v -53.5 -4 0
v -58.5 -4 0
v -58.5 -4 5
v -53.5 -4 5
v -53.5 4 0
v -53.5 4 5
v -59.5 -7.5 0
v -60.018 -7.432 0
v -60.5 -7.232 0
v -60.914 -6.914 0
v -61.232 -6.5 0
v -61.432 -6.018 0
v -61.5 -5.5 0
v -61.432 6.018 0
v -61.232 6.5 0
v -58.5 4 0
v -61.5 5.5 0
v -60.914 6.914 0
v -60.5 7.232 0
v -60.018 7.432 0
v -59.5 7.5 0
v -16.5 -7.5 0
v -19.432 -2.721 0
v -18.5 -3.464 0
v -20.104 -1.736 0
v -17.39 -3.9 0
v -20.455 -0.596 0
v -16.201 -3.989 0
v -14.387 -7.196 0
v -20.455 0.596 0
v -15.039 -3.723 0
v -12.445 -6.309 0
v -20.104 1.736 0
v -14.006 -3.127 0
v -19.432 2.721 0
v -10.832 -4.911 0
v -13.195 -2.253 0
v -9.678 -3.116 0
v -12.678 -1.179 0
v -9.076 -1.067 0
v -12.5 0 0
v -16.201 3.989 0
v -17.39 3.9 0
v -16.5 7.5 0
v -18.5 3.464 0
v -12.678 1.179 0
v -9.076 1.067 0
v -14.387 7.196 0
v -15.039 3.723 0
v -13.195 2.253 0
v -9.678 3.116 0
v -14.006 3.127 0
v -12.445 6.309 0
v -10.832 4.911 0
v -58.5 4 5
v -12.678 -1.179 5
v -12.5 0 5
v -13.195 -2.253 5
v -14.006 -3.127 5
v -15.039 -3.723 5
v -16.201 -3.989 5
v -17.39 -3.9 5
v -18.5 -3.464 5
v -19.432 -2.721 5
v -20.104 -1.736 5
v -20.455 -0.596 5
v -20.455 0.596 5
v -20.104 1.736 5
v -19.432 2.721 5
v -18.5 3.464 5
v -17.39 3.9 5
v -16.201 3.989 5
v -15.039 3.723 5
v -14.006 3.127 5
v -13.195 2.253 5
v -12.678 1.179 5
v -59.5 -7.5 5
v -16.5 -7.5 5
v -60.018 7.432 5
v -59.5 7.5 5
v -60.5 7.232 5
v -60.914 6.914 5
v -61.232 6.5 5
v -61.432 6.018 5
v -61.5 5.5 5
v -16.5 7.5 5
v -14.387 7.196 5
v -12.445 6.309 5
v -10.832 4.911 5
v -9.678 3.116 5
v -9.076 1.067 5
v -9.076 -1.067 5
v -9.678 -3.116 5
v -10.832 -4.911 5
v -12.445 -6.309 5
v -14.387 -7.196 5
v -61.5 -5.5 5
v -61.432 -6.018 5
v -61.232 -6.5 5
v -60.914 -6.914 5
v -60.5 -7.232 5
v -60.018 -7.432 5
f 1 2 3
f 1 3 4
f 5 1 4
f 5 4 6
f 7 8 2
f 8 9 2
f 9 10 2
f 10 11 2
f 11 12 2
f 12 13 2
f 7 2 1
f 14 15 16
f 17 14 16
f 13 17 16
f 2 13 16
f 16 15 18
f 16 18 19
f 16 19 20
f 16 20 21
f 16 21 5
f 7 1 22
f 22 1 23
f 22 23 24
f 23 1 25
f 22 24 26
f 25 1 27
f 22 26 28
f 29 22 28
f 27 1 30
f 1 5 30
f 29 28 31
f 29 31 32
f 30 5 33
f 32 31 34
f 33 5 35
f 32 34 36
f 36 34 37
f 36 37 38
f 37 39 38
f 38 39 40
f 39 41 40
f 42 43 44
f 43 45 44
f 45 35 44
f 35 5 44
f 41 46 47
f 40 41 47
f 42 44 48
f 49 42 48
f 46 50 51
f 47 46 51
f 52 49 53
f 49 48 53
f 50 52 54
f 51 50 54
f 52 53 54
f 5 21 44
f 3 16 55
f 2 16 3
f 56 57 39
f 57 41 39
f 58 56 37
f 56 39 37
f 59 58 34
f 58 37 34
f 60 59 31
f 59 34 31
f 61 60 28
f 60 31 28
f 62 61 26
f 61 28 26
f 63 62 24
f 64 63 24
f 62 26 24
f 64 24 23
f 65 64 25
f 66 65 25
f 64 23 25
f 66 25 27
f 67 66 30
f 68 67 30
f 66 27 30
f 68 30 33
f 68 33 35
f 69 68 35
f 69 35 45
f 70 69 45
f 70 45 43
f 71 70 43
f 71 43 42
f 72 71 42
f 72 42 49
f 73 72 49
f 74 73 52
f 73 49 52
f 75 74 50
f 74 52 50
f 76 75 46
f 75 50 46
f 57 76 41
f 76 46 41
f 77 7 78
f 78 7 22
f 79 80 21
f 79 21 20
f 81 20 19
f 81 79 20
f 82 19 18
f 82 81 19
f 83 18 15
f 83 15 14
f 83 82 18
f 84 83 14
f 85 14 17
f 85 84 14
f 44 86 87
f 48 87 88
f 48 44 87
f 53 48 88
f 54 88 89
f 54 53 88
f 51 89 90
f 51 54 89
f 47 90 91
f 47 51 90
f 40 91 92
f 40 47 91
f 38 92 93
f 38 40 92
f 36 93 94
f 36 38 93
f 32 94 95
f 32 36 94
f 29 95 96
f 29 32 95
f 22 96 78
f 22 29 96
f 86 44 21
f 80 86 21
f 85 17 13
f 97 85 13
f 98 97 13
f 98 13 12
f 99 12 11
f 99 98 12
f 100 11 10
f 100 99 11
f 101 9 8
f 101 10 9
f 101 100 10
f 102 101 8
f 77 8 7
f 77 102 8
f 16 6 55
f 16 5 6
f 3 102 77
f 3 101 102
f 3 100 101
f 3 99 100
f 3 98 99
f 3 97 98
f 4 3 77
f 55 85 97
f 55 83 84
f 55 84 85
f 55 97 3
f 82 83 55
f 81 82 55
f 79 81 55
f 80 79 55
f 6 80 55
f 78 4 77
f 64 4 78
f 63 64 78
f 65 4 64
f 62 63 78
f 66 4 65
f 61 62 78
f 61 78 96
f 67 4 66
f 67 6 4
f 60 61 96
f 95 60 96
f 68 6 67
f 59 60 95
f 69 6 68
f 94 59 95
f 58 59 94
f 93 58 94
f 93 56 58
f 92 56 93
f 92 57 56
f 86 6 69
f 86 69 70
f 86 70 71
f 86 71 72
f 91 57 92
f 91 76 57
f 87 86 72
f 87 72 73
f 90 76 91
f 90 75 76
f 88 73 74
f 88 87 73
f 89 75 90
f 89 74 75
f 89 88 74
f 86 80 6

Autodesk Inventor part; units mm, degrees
ref_plane "YZ Plane" through (0, 0, 0) normal (1, 0, 0) x (0, 1, 0)
ref_plane "XZ Plane" through (0, 0, 0) normal (0, 1, 0) x (-1, 0, 0)
ref_plane "XY Plane" through (0, 0, 0) normal (0, 0, 1) x (1, 0, 0)
sketch "Skizze1" plane through (0, 0, 0) normal (0, 0, 1) x (1, 0, 0)
  line L0 (0, -24.15) -> (0, 24.15) projected
  line L1 (-77.25, 0) -> (33, 0) projected
  circle A0 centre (-15.5, 15.5) radius 1.75
  circle A1 centre (15.5, 15.5) radius 1.75
  circle A2 centre (-15.5, -15.5) radius 1.75
  circle A3 centre (15.5, -15.5) radius 1.75
  circle A4 centre (-16.5, 0) radius 11
  circle A5 centre (0, 0) radius 5.5
  circle A6 centre (-16.5, 0) radius 4
  arc A7 (-16.5, -7.5) -> (-16.5, 7.5) centre (-16.5, 0) ccw
  line L2 (-16.5, 7.5) -> (-36.5, 7.5)
  line L3 (-36.5, 7.5) -> (-61.5, 7.5)
  line L4 (-61.5, 7.5) -> (-61.5, -7.5)
  line L5 (-61.5, -7.5) -> (-16.5, -7.5)
  dimension "d0" = 3.5
  dimension "d1" = 15.5
  dimension "d2" = 15.5
  dimension "d3" = 22
  dimension "d4" = 16.5
  dimension "d5" = 11
  dimension "d6" = 8
  dimension "d7" = 15
  dimension "d10" = 15
  dimension "d11" = 45
extrude "Extrusion1" add sketch "Skizze1" along normal blind 5 contours A7 L5 A4 L1 A6 | L1 A6 A4 L2 A7 | A4 L1 L4 L3 L2 | L5 L4 L1 A4
sketch "Skizze3" plane through (0, 0, 0) normal (0, 0, -1) x (-1, 0, 0)
  circle A0 centre (16.5, 0) radius 4 projected
  arc A1 (16.5, 7.5) -> (16.5, -7.5) centre (16.5, 0) ccw projected
  line L0 (16.5, -7.5) -> (61.5, -7.5) projected
  line L1 (61.5, -7.5) -> (61.5, 7.5) projected
  line L2 (61.5, 7.5) -> (16.5, 7.5) projected
  line L3 (58.5, -4) -> (53.5, -4)
  line L4 (53.5, -4) -> (53.5, 4)
  line L5 (53.5, 4) -> (58.5, 4)
  line L6 (58.5, 4) -> (58.5, -4)
  line L7 (73.8, 0) -> (-12.3, 0) projected
  point P0 (0, 0)
  dimension "d17" = 5
  dimension "d18" = 8
  dimension "d19" = 3
extrude "Extrusion3" cut sketch "Skizze3" against normal blind 5 contours L7 L6 L3 L4 | L4 L5 L6 L7
fillet "Rundung1" radius 2 2 edges at (-61.5, -7.5, 2.5) (-61.5, 7.5, 2.5)
properties part number "Kugellager-Schieber-Seite" material "ABS-Kunststoff"
